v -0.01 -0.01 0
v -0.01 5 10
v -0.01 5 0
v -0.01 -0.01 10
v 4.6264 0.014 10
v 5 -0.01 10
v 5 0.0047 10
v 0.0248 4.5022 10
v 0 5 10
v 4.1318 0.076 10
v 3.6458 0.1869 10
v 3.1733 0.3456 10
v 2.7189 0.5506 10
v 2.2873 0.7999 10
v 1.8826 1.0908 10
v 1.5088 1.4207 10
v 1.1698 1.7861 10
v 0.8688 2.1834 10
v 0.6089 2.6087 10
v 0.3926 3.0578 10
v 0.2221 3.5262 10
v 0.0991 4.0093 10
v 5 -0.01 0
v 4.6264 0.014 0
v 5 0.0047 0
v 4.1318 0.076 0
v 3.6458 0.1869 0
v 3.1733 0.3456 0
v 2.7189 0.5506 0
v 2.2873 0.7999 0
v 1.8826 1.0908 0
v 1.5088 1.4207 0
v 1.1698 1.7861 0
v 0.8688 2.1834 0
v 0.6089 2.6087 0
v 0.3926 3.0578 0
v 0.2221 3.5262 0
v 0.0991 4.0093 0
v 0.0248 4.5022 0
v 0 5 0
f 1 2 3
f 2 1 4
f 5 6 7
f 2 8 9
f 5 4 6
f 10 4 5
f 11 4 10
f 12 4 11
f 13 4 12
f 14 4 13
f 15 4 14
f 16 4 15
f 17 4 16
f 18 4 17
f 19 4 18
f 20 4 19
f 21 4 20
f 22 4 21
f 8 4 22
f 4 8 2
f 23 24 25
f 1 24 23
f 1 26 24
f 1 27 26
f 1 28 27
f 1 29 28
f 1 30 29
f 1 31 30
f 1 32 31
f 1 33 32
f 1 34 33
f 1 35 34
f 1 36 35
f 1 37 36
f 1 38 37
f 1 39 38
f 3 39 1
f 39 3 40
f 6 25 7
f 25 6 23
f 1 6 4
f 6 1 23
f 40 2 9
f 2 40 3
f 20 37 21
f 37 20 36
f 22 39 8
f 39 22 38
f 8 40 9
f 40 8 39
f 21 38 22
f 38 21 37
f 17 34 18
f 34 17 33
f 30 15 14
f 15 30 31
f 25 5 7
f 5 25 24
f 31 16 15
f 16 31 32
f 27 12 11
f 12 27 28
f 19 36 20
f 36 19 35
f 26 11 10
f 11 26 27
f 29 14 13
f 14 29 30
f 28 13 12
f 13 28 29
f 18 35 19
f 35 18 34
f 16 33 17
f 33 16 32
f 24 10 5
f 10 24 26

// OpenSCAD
/*
 *    OpenScad functions to fillet
 *
 *    Copyright (C) 2016 Felipe Machado
 *    Universidad Rey Juan Carlos, Spain
 *    https://github.com/felipe-m
 *    License: LGPL 3.0 or later
 *
 *    to use this functions include in your file:
 * use <fillet.scad>
 *    if not in the same directory:
 * use <PATH_TO/fillet.scad>
 *    dont use 'include' instead of 'use' so you dont get the objects
 *    created in this file
*/


r_fillet = 5;
h_fillet = 10;

// adding 0.1mm to avoid non manifold corners when adding fillets and chamfers
nmf_add = 0.01;

// Having non-manifold problems with fillet_add, making it a little larger

// fillet: to substract, so we have to make it larger

module base_fillet_dif (r, h, fillet)
{  
  
  if (fillet==1) 
  {    
    difference ()
    {
     // -1, -2 y 2, 4 is to make the difference
     translate([0,0,-1])cube([r+1,r+1,h+2]);
     translate([0,0,-2])cylinder(r=r, h=h+4, $fa=1, $fs=0.5);
    }
  } else { // chamfer
    difference ()
    {
      translate([0,0,-1])cube([r+1,r+1,h+2]);
      // The cube has the vertexs on the X Y axis, so the difference
      // is done apropiately. 
      translate([0,0,-2])cylinder(r=r, h=h+4, $fn=4);
    }
  }
      
}

//*base_fillet_dif (r=r_fillet, h=h_fillet, fillet=1);
//*base_fillet_dif (r=r_fillet, h=h_fillet, fillet=0);


// ---------------------- FILLET_DIF -------------------------
// Makes a fillet in a vertical line used for difference
// It is bigger to be used for the difference
// So the dimensions are the dimensions of the fillet, 
// YOU DON'T HAVE TO MAKE IT LARGER to consider the difference
//   (to avoid non-manifold)
// r: Radius of the fillet
// h: Height of the fillet
// --------- taken away
// // x: position of the fillet (lowest X point)
// // Y: position of the fillet (lowest Y point)
// ----------------------
// xdir: x direction of the fillet. Values: 1, -1
// ydir: y direction of the fillet. Values: 1, -1
//
//                   Y
//            _      |     _
//   x=-1   /        |       \  x=1, y=1
//   y= 1   |        |       |
//                   |
//         -------------------> X +
//                   |        
//   x=-1   |        |       |   x=1
//   y=-1    \_      |    _ /    y=-1
//                   |
// fillet: fillet or chamfer
//         1: fillet
//         0: chamfer



//module fillet_dif_z (r, h, x, y, xdir, ydir, fillet)


module fillet_dif_z (r, h, xdir, ydir, fillet)
{
// This is what we want to do:    
//    if ((xdir == 1) && (ydir == 1)) {
//      rotation = 0;
//    } else if ((xdir == -1) && (ydir == 1)) {
//      rotation = 90;  
//    } else if ((xdir == -1) && (ydir == -1)) {
//      rotation = 180;
//    } else if ((xdir ==  1) && (ydir == -1)) {
//      rotation = 270;
//    } else {
//      echo ("Error: incorrect values for xdir, ydir");
//    }
// But since it is not possible in oscad, we do this way:
    // atan gives 45 when xdir== 1 and ydir== 1 
    //                 or xdir==-1 and ydir==-1
    // so we make it 0
    //
    // atan gives -45 when xdir==-1 and ydir== 1 
    //                  or xdir== 1 and ydir==-1
    // so whe make it -90 (270)
    //
    angle_aux =  atan (ydir/xdir) - 45;
    //echo ("angle: ", angle_aux);
     
    // when xdir == -1 we add 180, making:
    // from 0 of (xdir==-1 and ydir==-1) to 180
    // from -90 of (xdir==-1 and ydir== 1) to 90
    rotation = (xdir == 1) ? angle_aux : angle_aux + 180;
        
    //echo ("rotation: ", rotation);
    
    //translate([x,y,0]) // required translation
    translate([-xdir*r, -ydir*r,0])  // to have it in 0,0
      rotate ([0,0,rotation])
      base_fillet_dif (r=r, h=h, fillet=fillet);
}
    

//fillet_dif_z (r=r_fillet, h=h_fillet, xdir=1, ydir=1, fillet=1);
//fillet_dif_z (r=r_fillet, h=h_fillet, xdir=-1, ydir=1, fillet=1);
//fillet_dif_z (r=r_fillet, h=h_fillet, xdir=1, ydir=-1, fillet=1);
//fillet_dif_z (r=r_fillet, h=h_fillet, xdir=-1, ydir=-1, fillet=1);


// see the explanation on filled_add_x
module fillet_dif_x (r, h, ydir, zdir, fillet)
{
      if ((ydir == 1) && (zdir == 1)) {
      rotate ([0,90,0])
        fillet_dif_z (r=r, h=h, xdir=-1, ydir=1, fillet=fillet);
    } else if ((ydir == -1) && (zdir == 1)) {
      rotate ([0,90,0])
         fillet_dif_z (r=r, h=h, xdir=-1, ydir=-1, fillet=fillet);
    } else if ((ydir == 1) && (zdir == -1)) {
       rotate ([0,90,0])
       fillet_dif_z (r=r, h=h, xdir=1, ydir=1, fillet=fillet);
    } else if ((ydir == -1) && (zdir == -1)) {
       rotate ([0,90,0])
       fillet_dif_z (r=r, h=h, xdir=1, ydir=-1, fillet=fillet);
    } else {
        echo ("wrong ydir, zdir");
    }
}
    
//fillet_dif_x (r=r_fillet, h=h_fillet, ydir=-1, zdir=-1, fillet=1);

module fillet_dif_y (r, h, xdir, zdir, fillet)
{
       if ((xdir == 1) && (zdir == 1)) {
      rotate ([-90,0,0])
        fillet_dif_z (r=r, h=h, xdir=1, ydir=-1, fillet=fillet);
    } else if ((xdir == -1) && (zdir == 1)) {
      rotate ([-90,0,0])
         fillet_dif_z (r=r, h=h, xdir=-1, ydir=-1, fillet=fillet);
    } else if ((xdir == 1) && (zdir == -1)) {
       rotate ([-90,0,0])
       fillet_dif_z (r=r, h=h, xdir=1, ydir=1, fillet=fillet);
    } else if ((xdir == -1) && (zdir == -1)) {
       rotate ([-90,0,0])
       fillet_dif_z (r=r, h=h, xdir=-1, ydir=1, fillet=fillet);
    } else {
        echo ("wrong xdir, zdir");
    }
}

//fillet_dif_y (r=r_fillet, h=h_fillet, xdir=-1, zdir=-1, fillet=1);
//fillet_dif_y (r=r_fillet, h=h_fillet, xdir=1, zdir=1, fillet=1);

// ---------- chamfer to add, so no need to add milimitre to avoid nonmanifold

diagonal = 4;
largo = 50;

module chamfer_hal (diagonal, largo) 
{
    difference () {
        cube ([diagonal, largo, diagonal]);
        // le pongo 2*diagonal, para no estar con cuadrados y raices
        if (diagonal < 3) {
          translate([-1,-1, diagonal+1]) rotate ([0,45,0]) cube ([4*diagonal, largo+2, 4*diagonal]);
        } else {
          translate([-1,-1, diagonal+1]) rotate ([0,45,0]) cube ([2*diagonal, largo+2, 2*diagonal]);
        }  
    }
}

*chamfer_hal(diagonal=diagonal, largo=largo);

module base_fillet_add (r, h, fillet)
{  
  
  if (fillet==1) 
  {    
    difference ()
    {

     cube([r+nmf_add,r+nmf_add,h]);
     translate([0,0,-1])cylinder(r=r, h=h+2, $fa=1, $fs=0.5);
    }
  } else { // chamfer
    difference ()
    {
      cube([r+nmf_add,r+nmf_add,h]);
      translate([0,0,-1])cylinder(r=r, h=h+2, $fn=4);
    }
  }
      
}

//base_fillet_add (r=r_fillet, h=h_fillet, fillet=1);
*base_fillet_add (r=r_fillet, h=h_fillet, fillet=0);

// ------------------------ fillet_add_z ------------------------
// adds a vertical fillet
// Makes a fillet in a vertical line used for union difference
// r: Radius of the fillet
// h: Height of the fillet
// ---------- taken out
// //  x: position of the fillet (lowest X point)
// //  Y: position of the fillet (lowest Y point)
// ---------------
// xdir: x direction of the fillet. Values: 1, -1
// ydir: y direction of the fillet. Values: 1, -1
//
//                   Y
//                   |    
//   x=-1        |   |   |      x=1, y=1
//   y= 1      _ /   |   \_    
//                   |
//         -------------------> X +
//             _     |    _     
//   x=-1        \   |   /         x=1
//   y=-1        |   |   |      y=-1
//                   |
// fillet: fillet or chamfer
//         1: fillet
//         0: chamfer


//module fillet_add_z (r, h, x, y, xdir, ydir, fillet)

module fillet_add_z (r, h, xdir, ydir, fillet)
{
// This is what we want to do:    
//    if ((xdir == 1) && (ydir == 1)) {
//      rotation = 180;
//    } else if ((xdir == -1) && (ydir == 1)) {
//      rotation = 270;  
//    } else if ((xdir == -1) && (ydir == -1)) {
//      rotation = 0;
//    } else if ((xdir ==  1) && (ydir == -1)) {
//      rotation = 90;
//    } else {
//      echo ("Error: incorrect values for xdir, ydir");
//    }
// But since it is not possible in oscad, we do this way:
    // atan gives 45 when xdir== 1 and ydir== 1 
    //                 or xdir==-1 and ydir==-1
    // so we make it 0
    //
    // atan gives -45 when xdir==-1 and ydir== 1 
    //                  or xdir== 1 and ydir==-1
    // so whe make it -90 (270)
    //
    angle_aux =  atan (ydir/xdir) - 45;
    //echo ("angle: ", angle_aux);
     
    // when xdir == 1 we add 180, making:
    // from 0 of (xdir==1 and ydir==1) to 180
    // from -90 of (xdir==1 and ydir== -1) to 90
    rotation = (xdir == 1) ? angle_aux +180 : angle_aux;
        
    //echo ("rotation: ", rotation);
    
    //translate([x,y,0]) // required translation
      translate([xdir*r, ydir*r,0])  // to have it in 0,0
      rotate ([0,0,rotation])
      base_fillet_add (r=r, h=h, fillet=fillet);
}
    
fillet_add_z (r=r_fillet, h=h_fillet, xdir=1, ydir=1, fillet=1);
//fillet_add_z (r=r_fillet, h=h_fillet, xdir=-1, ydir=1, fillet=0);
//%fillet_add_z (r=r_fillet, h=h_fillet, xdir=1, ydir=-1, fillet=1);
//#fillet_add_z (r=r_fillet, h=h_fillet, xdir=-1, ydir=-1, fillet=1);

// ----------------------------- fillet_add_x -----------------
// adds a fillet on the X axis (laying down).
// It will be on the origin. 
// translate it to move it. Place it on the lowest X point

//
//                   Z
//                   |    
//   y=-1        |   |   |      y=1, z=1
//   z= 1      _ /   |   \_    
//                   |
//         -------------------> Y +
//             _     |    _     
//   y=-1        \   |   /      y=1
//   z=-1        |   |   |      z=-1
//                   |
// fillet: fillet or chamfer
//         1: fillet
//         0: chamfer


module fillet_add_x (r, h, ydir, zdir, fillet)
{
    if ((ydir == 1) && (zdir == 1)) {
      rotate ([0,90,0])
        fillet_add_z (r=r, h=h, xdir=-1, ydir=1, fillet=fillet);
    } else if ((ydir == -1) && (zdir == 1)) {
      rotate ([0,90,0])
         fillet_add_z (r=r, h=h, xdir=-1, ydir=-1, fillet=fillet);
    } else if ((ydir == 1) && (zdir == -1)) {
       rotate ([0,90,0])
       fillet_add_z (r=r, h=h, xdir=1, ydir=1, fillet=fillet);
    } else if ((ydir == -1) && (zdir == -1)) {
       rotate ([0,90,0])
       fillet_add_z (r=r, h=h, xdir=1, ydir=-1, fillet=fillet);
    } else {
        echo ("wrong ydir, zdir");
    }
}

//fillet_add_x (r=r_fillet, h=h_fillet, ydir=1, zdir=-1, fillet=1);


// ----------------------------- fillet_add_y -----------------
// adds a fillet on the Y axis (laying down).
// It will be on the origin. 
// translate it to move it. Place it on the lowest Y point

//
//                   Z
//                   |    
//   x=-1        |   |   |      x=1, z=1
//   z= 1      _ /   |   \_    
//                   |
//         -------------------> X +
//             _     |    _     
//   x=-1        \   |   /      x=1
//   z=-1        |   |   |      z=-1
//                   |
// fillet: fillet or chamfer
//         1: fillet
//         0: chamfer


module fillet_add_y (r, h, xdir, zdir, fillet)
{
    if ((xdir == 1) && (zdir == 1)) {
      rotate ([-90,0,0])
        fillet_add_z (r=r, h=h, xdir=1, ydir=-1, fillet=fillet);
    } else if ((xdir == -1) && (zdir == 1)) {
      rotate ([-90,0,0])
         fillet_add_z (r=r, h=h, xdir=-1, ydir=-1, fillet=fillet);
    } else if ((xdir == 1) && (zdir == -1)) {
       rotate ([-90,0,0])
       fillet_add_z (r=r, h=h, xdir=1, ydir=1, fillet=fillet);
    } else if ((xdir == -1) && (zdir == -1)) {
       rotate ([-90,0,0])
       fillet_add_z (r=r, h=h, xdir=-1, ydir=1, fillet=fillet);
    } else {
        echo ("wrong xdir, zdir");
    }
}


//#fillet_add_y (r=r_fillet, h=h_fillet, xdir=1, zdir=-1, fillet=1);
//fillet_add_y (r=r_fillet, h=h_fillet, xdir=-1, zdir=1, fillet=1);
//%fillet_add_y (r=r_fillet, h=h_fillet, xdir=1, zdir=1, fillet=1);
//fillet_add_y (r=r_fillet, h=h_fillet, xdir=-1, zdir=-1, fillet=1);
